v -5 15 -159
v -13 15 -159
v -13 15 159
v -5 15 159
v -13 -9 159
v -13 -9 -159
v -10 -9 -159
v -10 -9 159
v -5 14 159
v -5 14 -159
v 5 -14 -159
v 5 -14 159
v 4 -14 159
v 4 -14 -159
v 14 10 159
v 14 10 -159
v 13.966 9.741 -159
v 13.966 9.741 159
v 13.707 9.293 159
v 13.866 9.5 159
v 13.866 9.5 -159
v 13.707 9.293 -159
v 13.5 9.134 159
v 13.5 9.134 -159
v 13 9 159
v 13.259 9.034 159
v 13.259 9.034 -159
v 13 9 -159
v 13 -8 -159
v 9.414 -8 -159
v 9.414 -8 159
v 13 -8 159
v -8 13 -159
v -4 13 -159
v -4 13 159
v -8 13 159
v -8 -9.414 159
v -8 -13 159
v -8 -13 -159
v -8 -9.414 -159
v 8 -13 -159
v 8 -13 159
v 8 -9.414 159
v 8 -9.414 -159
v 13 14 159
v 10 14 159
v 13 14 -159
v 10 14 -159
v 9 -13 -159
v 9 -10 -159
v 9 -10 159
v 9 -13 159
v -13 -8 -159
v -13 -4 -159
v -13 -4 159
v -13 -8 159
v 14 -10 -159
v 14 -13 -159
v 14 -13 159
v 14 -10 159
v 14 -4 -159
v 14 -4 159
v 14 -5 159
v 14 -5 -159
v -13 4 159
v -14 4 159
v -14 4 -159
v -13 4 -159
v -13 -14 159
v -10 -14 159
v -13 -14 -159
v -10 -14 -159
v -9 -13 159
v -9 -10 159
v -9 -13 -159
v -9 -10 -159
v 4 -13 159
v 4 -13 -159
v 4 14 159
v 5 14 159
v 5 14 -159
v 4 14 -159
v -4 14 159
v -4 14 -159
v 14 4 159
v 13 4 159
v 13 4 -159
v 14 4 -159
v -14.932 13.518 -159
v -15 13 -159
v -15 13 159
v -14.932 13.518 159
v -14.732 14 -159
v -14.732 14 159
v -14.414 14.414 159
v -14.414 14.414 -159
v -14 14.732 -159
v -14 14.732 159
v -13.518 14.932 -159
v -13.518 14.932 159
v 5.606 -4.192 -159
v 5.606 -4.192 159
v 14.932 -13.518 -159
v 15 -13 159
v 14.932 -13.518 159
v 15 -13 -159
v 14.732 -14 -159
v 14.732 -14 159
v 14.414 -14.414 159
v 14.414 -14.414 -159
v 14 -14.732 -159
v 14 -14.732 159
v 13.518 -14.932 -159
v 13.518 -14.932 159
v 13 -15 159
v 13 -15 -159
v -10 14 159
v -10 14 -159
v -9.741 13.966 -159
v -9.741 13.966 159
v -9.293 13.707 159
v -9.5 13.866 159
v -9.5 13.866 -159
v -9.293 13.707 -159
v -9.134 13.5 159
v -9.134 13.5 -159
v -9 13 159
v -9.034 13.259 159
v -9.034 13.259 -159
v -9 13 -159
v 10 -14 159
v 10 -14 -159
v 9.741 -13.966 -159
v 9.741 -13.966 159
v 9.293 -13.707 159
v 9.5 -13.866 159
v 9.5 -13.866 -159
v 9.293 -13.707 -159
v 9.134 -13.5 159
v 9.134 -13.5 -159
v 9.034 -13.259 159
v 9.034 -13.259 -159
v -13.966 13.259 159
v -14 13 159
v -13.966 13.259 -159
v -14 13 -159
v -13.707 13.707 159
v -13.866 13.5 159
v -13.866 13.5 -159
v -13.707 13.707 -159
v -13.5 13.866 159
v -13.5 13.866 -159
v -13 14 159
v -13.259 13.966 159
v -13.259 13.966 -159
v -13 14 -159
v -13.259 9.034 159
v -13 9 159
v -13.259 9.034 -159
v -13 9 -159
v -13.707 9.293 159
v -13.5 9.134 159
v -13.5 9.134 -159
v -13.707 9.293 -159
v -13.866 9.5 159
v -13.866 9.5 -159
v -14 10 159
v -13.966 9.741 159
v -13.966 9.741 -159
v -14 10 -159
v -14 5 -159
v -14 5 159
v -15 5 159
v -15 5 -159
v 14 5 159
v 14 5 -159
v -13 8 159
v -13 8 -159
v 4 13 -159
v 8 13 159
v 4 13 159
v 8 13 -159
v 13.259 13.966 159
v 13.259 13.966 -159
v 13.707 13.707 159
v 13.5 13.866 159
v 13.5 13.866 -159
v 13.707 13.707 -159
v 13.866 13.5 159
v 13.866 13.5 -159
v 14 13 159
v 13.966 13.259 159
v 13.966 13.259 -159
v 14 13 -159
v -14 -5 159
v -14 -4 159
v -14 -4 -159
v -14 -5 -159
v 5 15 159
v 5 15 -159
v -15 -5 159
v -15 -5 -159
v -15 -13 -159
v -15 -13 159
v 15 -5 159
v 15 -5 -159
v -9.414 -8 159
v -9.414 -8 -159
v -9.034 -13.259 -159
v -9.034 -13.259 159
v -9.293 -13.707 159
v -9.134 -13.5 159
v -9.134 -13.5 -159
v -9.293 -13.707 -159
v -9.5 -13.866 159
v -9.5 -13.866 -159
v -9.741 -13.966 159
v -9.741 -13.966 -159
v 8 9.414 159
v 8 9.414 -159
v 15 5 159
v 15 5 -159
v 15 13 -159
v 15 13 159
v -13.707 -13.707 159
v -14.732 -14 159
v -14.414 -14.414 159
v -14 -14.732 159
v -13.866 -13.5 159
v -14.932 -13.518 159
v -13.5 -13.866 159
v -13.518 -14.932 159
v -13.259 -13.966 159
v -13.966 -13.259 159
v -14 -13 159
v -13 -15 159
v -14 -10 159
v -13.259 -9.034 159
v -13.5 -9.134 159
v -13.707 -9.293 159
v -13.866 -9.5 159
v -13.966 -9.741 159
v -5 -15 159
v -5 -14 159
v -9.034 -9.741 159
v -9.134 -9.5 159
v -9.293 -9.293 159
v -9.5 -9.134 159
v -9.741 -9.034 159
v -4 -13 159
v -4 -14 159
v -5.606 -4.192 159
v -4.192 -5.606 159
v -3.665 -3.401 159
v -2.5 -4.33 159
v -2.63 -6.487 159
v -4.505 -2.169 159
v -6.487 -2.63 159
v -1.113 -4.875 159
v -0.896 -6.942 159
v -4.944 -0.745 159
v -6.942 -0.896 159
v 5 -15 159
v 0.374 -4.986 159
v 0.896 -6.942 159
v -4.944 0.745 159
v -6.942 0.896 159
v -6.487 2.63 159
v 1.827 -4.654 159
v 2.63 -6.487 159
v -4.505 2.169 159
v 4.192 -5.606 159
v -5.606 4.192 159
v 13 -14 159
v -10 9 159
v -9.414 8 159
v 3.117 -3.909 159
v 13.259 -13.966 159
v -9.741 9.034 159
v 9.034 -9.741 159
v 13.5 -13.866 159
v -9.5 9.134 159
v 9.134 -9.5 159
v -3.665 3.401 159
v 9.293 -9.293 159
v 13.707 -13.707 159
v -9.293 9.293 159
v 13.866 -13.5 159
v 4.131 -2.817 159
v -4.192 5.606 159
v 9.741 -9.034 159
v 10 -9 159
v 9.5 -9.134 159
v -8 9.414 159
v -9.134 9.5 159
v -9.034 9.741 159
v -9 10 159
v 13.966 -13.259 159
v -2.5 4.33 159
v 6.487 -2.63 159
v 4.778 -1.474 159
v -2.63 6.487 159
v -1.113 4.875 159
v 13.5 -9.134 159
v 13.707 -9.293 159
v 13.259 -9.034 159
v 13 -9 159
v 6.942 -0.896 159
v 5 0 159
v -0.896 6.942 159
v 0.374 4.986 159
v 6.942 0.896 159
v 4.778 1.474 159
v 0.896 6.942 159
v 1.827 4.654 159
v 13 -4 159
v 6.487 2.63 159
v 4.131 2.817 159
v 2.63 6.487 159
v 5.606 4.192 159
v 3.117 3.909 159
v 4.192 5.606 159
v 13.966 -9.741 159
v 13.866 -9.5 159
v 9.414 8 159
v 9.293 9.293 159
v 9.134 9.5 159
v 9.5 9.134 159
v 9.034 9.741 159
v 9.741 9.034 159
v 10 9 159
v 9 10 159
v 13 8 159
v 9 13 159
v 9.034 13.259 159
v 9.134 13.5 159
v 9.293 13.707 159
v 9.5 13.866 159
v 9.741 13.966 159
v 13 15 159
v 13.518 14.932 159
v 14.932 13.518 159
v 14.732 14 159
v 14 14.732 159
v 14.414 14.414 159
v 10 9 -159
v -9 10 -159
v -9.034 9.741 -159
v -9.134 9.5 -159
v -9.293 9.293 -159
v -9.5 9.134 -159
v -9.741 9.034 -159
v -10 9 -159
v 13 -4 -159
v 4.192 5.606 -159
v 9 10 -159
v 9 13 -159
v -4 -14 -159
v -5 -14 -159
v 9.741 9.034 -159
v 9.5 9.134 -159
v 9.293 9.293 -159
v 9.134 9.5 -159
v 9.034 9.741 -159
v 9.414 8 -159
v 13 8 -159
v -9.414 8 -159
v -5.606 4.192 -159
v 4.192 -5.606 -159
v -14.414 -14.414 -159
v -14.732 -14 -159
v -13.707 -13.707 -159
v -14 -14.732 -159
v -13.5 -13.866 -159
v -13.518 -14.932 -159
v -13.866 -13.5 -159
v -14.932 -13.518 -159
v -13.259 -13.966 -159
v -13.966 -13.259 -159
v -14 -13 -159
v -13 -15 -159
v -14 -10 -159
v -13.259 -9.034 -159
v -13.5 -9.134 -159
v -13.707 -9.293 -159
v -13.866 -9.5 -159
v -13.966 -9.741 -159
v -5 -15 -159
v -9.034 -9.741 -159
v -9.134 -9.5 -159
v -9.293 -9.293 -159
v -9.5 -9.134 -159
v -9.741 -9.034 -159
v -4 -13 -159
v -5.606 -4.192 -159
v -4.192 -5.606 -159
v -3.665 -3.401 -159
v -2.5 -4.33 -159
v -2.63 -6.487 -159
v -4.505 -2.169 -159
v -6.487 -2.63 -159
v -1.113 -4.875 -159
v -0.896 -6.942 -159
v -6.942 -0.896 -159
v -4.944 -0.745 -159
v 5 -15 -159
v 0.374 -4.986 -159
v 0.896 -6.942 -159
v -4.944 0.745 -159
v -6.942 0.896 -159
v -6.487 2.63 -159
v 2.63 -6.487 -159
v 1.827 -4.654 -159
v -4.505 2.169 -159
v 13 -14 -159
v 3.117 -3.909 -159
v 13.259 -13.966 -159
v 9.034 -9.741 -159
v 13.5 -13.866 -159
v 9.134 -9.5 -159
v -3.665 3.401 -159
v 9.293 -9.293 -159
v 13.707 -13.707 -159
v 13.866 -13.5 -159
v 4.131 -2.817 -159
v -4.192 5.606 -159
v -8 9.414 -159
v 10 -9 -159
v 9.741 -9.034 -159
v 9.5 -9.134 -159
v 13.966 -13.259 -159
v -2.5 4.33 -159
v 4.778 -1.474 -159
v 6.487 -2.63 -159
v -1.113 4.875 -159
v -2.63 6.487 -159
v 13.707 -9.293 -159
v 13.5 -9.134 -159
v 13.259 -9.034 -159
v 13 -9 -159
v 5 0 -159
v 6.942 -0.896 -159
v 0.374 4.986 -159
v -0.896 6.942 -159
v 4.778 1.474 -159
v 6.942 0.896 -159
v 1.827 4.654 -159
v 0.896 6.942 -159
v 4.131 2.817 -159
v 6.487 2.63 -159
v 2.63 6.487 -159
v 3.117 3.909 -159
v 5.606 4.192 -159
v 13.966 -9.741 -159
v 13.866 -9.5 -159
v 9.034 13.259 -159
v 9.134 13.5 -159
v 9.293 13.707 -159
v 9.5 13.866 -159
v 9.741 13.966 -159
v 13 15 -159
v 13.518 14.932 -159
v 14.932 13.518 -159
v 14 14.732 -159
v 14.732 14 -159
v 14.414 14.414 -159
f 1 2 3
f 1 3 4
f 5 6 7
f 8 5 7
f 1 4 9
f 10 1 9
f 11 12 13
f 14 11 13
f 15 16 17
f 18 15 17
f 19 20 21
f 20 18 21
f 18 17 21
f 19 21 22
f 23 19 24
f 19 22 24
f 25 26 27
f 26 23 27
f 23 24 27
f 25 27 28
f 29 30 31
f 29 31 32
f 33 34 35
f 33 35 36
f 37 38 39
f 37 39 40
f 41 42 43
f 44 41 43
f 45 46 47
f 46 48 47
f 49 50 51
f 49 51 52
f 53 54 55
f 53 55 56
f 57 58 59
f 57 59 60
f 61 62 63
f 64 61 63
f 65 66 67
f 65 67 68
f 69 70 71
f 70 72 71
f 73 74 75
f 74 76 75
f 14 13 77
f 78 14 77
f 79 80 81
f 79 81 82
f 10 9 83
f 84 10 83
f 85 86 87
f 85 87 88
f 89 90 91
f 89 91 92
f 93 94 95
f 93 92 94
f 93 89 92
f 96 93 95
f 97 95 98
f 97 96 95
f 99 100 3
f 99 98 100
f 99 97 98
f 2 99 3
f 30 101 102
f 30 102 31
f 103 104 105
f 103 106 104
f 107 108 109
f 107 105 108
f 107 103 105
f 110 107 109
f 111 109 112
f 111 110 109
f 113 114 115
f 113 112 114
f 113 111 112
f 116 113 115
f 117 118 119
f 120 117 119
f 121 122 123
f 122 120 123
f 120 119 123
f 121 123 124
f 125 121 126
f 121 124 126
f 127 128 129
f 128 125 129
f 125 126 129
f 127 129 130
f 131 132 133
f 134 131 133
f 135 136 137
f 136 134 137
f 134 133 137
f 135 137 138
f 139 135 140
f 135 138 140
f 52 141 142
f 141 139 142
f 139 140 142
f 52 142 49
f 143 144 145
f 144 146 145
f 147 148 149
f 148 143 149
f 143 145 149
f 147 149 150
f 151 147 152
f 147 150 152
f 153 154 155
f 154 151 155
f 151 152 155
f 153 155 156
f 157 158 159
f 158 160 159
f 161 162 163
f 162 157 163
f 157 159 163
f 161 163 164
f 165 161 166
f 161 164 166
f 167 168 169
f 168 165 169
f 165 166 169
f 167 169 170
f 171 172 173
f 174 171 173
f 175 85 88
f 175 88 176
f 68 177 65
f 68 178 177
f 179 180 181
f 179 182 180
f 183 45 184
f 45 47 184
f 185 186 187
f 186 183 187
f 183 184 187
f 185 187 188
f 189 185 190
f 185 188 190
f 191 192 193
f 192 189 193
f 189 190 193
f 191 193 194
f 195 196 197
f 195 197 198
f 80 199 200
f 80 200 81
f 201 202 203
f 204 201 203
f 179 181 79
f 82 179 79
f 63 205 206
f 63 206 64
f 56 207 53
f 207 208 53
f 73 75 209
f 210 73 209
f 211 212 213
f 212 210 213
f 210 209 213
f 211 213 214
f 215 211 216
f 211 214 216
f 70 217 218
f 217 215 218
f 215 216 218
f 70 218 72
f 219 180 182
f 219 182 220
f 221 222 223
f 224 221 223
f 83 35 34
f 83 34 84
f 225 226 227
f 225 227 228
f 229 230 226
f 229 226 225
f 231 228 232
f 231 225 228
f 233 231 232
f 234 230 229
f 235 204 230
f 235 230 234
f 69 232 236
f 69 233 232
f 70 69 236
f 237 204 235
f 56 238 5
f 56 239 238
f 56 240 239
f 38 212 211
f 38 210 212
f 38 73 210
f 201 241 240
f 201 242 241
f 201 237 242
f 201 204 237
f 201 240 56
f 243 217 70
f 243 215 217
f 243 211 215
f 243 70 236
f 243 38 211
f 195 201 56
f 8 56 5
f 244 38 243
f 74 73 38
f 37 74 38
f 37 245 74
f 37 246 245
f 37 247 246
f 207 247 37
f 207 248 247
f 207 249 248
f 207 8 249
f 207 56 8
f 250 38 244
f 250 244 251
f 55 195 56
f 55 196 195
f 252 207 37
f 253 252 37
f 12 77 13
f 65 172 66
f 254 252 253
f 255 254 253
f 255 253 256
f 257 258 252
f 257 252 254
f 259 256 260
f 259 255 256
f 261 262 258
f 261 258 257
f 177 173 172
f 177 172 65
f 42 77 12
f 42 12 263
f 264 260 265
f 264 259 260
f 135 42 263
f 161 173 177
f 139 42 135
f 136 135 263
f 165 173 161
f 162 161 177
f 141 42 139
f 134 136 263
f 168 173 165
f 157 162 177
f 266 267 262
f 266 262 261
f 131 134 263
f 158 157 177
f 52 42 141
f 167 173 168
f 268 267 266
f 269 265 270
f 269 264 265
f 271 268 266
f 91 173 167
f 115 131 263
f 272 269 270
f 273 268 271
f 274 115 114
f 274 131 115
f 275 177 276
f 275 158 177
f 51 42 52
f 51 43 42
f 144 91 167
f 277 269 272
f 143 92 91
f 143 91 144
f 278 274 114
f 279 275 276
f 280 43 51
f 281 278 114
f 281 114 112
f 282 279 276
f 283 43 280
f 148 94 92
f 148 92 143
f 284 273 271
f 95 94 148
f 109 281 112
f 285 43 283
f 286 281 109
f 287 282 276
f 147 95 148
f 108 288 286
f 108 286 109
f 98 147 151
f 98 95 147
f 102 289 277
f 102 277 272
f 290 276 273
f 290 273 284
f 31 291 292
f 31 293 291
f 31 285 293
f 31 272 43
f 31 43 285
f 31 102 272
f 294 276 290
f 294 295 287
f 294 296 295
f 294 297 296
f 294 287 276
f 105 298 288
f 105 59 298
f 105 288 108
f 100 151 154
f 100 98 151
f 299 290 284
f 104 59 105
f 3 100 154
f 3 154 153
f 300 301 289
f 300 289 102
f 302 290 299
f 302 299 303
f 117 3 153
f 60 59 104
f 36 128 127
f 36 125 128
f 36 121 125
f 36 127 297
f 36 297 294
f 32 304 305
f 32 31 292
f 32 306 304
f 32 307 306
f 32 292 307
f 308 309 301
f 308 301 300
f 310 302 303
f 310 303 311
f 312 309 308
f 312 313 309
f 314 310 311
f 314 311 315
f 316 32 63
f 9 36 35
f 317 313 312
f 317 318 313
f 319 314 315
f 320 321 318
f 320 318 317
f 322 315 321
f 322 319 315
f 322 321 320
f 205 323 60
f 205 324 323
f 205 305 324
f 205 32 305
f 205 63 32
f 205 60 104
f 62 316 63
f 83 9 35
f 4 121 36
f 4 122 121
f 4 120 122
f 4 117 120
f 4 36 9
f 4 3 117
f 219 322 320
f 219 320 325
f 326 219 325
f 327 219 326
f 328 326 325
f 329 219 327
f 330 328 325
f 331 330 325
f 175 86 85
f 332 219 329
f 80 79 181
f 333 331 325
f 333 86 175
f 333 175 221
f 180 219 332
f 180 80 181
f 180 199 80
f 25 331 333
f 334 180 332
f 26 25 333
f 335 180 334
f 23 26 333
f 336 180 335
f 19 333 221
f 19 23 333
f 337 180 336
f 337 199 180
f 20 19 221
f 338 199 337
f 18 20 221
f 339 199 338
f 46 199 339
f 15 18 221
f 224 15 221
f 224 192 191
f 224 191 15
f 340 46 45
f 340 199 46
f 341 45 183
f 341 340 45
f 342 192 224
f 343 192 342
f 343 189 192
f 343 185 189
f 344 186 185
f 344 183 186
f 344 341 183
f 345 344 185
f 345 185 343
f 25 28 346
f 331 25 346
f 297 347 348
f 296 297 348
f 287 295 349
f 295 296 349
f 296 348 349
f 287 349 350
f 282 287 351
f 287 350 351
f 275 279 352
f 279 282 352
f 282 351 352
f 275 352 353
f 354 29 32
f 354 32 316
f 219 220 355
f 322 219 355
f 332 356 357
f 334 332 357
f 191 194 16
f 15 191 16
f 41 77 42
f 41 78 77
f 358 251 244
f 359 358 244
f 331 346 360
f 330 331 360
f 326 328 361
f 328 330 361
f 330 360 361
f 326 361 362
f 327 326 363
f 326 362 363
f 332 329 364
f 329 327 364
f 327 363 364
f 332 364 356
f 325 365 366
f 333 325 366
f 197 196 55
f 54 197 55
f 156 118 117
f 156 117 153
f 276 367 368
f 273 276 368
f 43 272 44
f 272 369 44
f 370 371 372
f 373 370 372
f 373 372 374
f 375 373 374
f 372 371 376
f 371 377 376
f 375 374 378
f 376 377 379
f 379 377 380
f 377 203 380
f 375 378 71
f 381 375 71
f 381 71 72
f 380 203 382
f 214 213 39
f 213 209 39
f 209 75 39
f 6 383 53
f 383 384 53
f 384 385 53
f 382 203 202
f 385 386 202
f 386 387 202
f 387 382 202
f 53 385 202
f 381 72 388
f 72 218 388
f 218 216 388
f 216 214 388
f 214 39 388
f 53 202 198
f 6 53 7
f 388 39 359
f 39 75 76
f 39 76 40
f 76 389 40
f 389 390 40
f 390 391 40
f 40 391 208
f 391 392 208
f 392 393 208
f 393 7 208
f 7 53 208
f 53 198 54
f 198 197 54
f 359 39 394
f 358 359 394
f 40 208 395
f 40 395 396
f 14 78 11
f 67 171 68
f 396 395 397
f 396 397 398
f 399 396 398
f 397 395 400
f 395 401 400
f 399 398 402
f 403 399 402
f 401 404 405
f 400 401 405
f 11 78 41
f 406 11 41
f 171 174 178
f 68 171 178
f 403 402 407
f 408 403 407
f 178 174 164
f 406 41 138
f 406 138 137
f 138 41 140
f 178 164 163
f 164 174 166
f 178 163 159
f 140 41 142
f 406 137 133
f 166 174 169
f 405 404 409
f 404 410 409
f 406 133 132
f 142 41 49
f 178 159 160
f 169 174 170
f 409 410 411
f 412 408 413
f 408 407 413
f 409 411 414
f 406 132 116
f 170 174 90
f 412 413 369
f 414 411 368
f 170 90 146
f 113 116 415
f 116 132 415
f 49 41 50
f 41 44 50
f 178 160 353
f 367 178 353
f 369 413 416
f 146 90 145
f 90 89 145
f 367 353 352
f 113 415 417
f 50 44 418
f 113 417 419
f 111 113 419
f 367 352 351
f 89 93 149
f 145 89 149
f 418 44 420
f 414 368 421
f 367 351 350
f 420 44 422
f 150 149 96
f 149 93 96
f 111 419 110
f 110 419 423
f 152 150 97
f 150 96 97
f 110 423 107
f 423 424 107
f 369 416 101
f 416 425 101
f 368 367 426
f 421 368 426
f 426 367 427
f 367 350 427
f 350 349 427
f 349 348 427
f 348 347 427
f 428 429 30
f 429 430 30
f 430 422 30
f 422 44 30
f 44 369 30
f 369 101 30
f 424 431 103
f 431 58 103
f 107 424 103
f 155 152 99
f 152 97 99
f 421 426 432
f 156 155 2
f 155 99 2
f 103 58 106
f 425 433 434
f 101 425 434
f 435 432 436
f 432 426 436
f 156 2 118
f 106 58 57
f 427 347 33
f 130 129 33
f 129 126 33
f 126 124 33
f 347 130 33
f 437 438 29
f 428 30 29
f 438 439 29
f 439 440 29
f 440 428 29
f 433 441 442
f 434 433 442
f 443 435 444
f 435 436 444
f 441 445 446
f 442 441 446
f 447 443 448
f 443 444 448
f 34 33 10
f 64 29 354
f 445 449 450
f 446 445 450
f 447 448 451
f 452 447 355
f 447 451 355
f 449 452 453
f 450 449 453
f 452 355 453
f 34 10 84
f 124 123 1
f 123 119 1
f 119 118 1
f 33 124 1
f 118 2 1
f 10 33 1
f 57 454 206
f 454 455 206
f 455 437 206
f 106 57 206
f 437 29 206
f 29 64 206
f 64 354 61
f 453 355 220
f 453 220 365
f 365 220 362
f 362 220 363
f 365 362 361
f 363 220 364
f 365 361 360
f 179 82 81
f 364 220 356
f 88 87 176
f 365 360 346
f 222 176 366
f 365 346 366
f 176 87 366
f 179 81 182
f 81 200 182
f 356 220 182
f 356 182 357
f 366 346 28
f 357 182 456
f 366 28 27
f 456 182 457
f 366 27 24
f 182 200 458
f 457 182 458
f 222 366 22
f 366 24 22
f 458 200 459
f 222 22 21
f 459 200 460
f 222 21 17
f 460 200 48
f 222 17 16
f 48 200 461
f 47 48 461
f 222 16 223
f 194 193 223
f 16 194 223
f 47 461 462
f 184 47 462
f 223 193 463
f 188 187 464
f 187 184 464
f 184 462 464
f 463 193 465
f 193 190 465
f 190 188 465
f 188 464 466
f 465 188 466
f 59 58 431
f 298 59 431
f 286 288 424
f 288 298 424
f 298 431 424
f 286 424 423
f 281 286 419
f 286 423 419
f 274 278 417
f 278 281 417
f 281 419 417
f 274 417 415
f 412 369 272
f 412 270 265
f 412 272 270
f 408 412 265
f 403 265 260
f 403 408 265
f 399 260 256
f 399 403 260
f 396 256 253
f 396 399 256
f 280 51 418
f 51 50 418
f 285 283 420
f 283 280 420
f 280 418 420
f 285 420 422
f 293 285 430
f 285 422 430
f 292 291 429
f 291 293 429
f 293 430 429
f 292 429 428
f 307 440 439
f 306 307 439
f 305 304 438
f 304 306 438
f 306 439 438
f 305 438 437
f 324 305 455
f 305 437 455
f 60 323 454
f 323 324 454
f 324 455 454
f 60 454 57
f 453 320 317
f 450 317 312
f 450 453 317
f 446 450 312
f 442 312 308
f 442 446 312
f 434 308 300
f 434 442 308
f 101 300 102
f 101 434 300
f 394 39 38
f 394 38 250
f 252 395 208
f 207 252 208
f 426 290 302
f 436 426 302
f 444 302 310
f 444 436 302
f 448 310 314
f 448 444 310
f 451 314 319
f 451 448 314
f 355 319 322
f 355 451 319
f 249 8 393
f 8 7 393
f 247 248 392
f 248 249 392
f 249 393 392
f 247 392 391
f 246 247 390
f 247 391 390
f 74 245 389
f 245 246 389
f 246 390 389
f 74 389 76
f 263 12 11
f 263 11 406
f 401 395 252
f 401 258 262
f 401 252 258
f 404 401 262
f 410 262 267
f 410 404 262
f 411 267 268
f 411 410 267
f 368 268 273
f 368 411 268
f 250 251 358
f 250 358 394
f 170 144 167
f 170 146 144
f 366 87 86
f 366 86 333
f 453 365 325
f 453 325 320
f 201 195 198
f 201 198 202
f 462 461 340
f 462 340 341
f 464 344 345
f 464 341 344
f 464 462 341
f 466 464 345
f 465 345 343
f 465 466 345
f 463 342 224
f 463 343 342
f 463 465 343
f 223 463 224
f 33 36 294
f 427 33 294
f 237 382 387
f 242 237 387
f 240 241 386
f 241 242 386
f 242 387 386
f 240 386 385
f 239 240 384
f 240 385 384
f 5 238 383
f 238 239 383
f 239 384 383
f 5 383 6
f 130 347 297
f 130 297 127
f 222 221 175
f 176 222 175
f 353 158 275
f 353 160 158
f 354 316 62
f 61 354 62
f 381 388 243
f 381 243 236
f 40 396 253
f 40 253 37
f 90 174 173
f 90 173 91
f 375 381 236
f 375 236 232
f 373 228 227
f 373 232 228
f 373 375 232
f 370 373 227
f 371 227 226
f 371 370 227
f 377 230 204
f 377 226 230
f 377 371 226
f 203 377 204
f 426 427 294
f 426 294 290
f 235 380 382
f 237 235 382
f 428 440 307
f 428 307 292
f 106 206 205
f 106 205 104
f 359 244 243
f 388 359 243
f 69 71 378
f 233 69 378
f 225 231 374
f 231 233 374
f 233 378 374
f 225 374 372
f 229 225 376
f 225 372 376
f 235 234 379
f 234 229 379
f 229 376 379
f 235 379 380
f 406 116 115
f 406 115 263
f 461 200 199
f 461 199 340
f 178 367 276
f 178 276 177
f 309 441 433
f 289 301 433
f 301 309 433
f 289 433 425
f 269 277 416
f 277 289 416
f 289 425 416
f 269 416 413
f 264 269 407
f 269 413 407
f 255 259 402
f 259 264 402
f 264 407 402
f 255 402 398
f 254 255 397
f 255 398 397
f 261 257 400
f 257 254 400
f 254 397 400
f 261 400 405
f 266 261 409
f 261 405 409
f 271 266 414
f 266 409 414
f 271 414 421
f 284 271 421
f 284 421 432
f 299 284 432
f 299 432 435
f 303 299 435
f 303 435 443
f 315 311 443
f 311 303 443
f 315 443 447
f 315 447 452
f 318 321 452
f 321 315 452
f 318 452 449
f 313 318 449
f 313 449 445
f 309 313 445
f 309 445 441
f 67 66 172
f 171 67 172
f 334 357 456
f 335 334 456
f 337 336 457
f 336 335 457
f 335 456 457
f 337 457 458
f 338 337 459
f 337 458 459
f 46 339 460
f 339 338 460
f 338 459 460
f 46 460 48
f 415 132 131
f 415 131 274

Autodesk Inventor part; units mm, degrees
ref_plane "YZ Plane" through (0, 0, 0) normal (1, 0, 0) x (0, 1, 0)
ref_plane "XZ Plane" through (0, 0, 0) normal (0, 1, 0) x (-1, 0, 0)
ref_plane "XY Plane" through (0, 0, 0) normal (0, 0, 1) x (1, 0, 0)
sketch "Sketch1" plane through (0, 0, 0) normal (0, 0, 1) x (1, 0, 0)
  circle A0 centre (0, 0) radius 5
  arc A1 (-13, 15) -> (-15, 13) centre (-13, 13) ccw
  arc A2 (-15, -13) -> (-13, -15) centre (-13, -13) ccw
  arc A3 (13, -15) -> (15, -13) centre (13, -13) ccw
  arc A4 (15, 13) -> (13, 15) centre (13, 13) ccw
  arc A5 (-13, 14) -> (-14, 13) centre (-13, 13) ccw
  arc A6 (-14, -13) -> (-13, -14) centre (-13, -13) ccw
  arc A7 (13, -14) -> (14, -13) centre (13, -13) ccw
  arc A8 (14, 13) -> (13, 14) centre (13, 13) ccw
  line L0 (14, -14) -> (-14, 14) construction
  line L1 (-14, -14) -> (14, 14) construction
  line L2 (15, -15) -> (-15, 15) construction
  line L3 (-15, -15) -> (15, 15) construction
  line L4 (-13, 15) -> (-8, 15)
  line L5 (-8, 13) -> (-8, 8) construction
  line L6 (-9.4142, 8) -> (-13, 8)
  line L7 (-15, 8) -> (-15, 13)
  line L8 (-13, -15) -> (-8, -15)
  line L9 (-8, -13) -> (-8, -9.4142)
  line L10 (-9.4142, -8) -> (-13, -8)
  line L11 (-15, -8) -> (-15, -13)
  line L12 (13, -15) -> (8, -15)
  line L13 (8, -13) -> (8, -9.4142)
  line L14 (9.4142, -8) -> (13, -8)
  line L15 (15, -8) -> (15, -13)
  line L16 (13, 15) -> (8, 15)
  line L17 (8, 13) -> (8, 9.4142)
  line L18 (9.4142, 8) -> (13, 8)
  line L19 (15, 8) -> (15, 13)
  line L20 (-13, 9) -> (-10, 9)
  line L21 (-9, 10) -> (-9, 13)
  line L22 (-10, 14) -> (-13, 14)
  line L23 (-14, 13) -> (-14, 10)
  line L24 (13, 9) -> (10, 9)
  line L25 (9, 10) -> (9, 13)
  line L26 (10, 14) -> (13, 14)
  line L27 (14, 13) -> (14, 10)
  line L28 (13, -9) -> (10, -9)
  line L29 (9, -10) -> (9, -13)
  line L30 (10, -14) -> (13, -14)
  line L31 (14, -13) -> (14, -10)
  line L32 (-13, -9) -> (-10, -9)
  line L33 (-9, -10) -> (-9, -13)
  line L34 (-10, -14) -> (-13, -14)
  line L35 (-14, -13) -> (-14, -10)
  line L36 (-14, 13) -> (-14, 10)
  line L37 (-14, -10) -> (-14, -13)
  line L38 (-14, -13) -> (-14, -10)
  line L39 (-14, 10) -> (-14, 13)
  line L40 (13, -15) -> (5, -15)
  line L41 (-5, -15) -> (-13, -15)
  line L42 (13, -15) -> (5, -15) construction
  line L43 (0, -15) -> (-13, -15) construction
  line L44 (4, -13) -> (8, -13)
  line L45 (-8, -13) -> (-4, -13)
  line L46 (10, -9) -> (13, -9)
  line L47 (14, -10) -> (14, -13)
  line L48 (13, -14) -> (10, -14)
  line L49 (9, -13) -> (9, -10)
  line L50 (5, -14) -> (5, -15)
  line L51 (13, -14) -> (10, -14)
  line L52 (5, -14) -> (4, -14)
  line L53 (4, -14) -> (5, -14)
  line L54 (10, -14) -> (13, -14)
  line L55 (-4, -14) -> (-5, -14)
  line L56 (-10, -14) -> (-13, -14)
  line L57 (-13, -14) -> (-10, -14)
  line L58 (-5, -14) -> (-4, -14)
  line L59 (14, -13) -> (14, -10)
  line L60 (14, 10) -> (14, 13)
  line L61 (14, 13) -> (14, 10)
  line L62 (14, -10) -> (14, -13)
  line L63 (-5, -14) -> (-5, -15)
  line L64 (10, 14) -> (13, 14)
  line L65 (13, 14) -> (10, 14)
  line L66 (-10, 14) -> (-13, 14)
  line L67 (-13, 14) -> (-10, 14)
  line L68 (-5, 15) -> (-5, 14)
  line L69 (-13, 15) -> (-5, 15)
  line L70 (5, 15) -> (13, 15)
  line L71 (-15, 15) -> (-5, 15) construction
  line L72 (5, 15) -> (15, 15) construction
  line L73 (5, 15) -> (5, 14)
  line L74 (8, 13) -> (4, 13)
  line L75 (5, 14) -> (4, 14)
  line L76 (-5, 14) -> (-4, 14)
  line L77 (4, 14) -> (5, 14)
  line L78 (-4, 13) -> (-8, 13)
  line L79 (-4, 14) -> (-5, 14)
  line L80 (4, 13) -> (4, 14)
  line L81 (-4, 13) -> (-4, 14)
  line L82 (-4, -14) -> (-4, -13)
  line L83 (4, -14) -> (4, -13)
  line L84 (-8, 9.4142) -> (-4.1919, 5.6061)
  line L85 (8, 9.4142) -> (4.1919, 5.6061)
  line L86 (9.4142, 8) -> (5.6061, 4.1919)
  line L87 (5.6061, -4.1919) -> (9.4142, -8)
  line L88 (4.1919, -5.6061) -> (8, -9.4142)
  line L89 (-4.1919, -5.6061) -> (-8, -9.4142)
  line L90 (-5.6061, -4.1919) -> (-9.4142, -8)
  line L91 (-9.4142, 8) -> (-5.6061, 4.1919)
  arc A9 (4.1919, 5.6061) -> (-4.1919, 5.6061) centre (0, 0) ccw
  arc A10 (5.6061, -4.1919) -> (5.6061, 4.1919) centre (0, 0) ccw
  arc A11 (-5.6061, 4.1919) -> (-5.6061, -4.1919) centre (0, 0) ccw
  arc A12 (-4.1919, -5.6061) -> (4.1919, -5.6061) centre (0, 0) ccw
  line L92 (-8, 13) -> (-8, 9.4142)
  line L93 (-15, -13) -> (-15, -5) construction
  line L94 (-15, -13) -> (-15, -5)
  line L95 (-15, 5) -> (-15, 13)
  line L96 (15, -5) -> (15, -13) construction
  line L97 (15, 13) -> (15, 5)
  line L98 (15, -5) -> (15, -13)
  line L99 (-14, -4) -> (-14, -5)
  line L100 (14, -4) -> (14, -5)
  line L101 (14, 4) -> (14, 5)
  line L102 (-14, 4) -> (-14, 5)
  line L103 (-13, 8) -> (-13, 4)
  line L104 (13, 4) -> (13, 8)
  line L105 (13, -8) -> (13, -4)
  line L106 (-13, -4) -> (-13, -8)
  line L107 (-14, -5) -> (-15, -5)
  line L108 (15, -5) -> (14, -5)
  line L109 (15, 5) -> (14, 5)
  line L110 (-14, 5) -> (-15, 5)
  line L111 (13, 4) -> (14, 4)
  line L112 (-14, 4) -> (-13, 4)
  line L113 (-14, -4) -> (-13, -4)
  line L114 (13, -4) -> (14, -4)
  arc A13 (-13, -9) -> (-14, -10) centre (-13, -10) ccw
  arc A14 (-9, -10) -> (-10, -9) centre (-10, -10) ccw
  arc A15 (-10, -14) -> (-9, -13) centre (-10, -13) ccw
  arc A16 (10, -9) -> (9, -10) centre (10, -10) ccw
  arc A17 (9, -13) -> (10, -14) centre (10, -13) ccw
  arc A18 (14, -10) -> (13, -9) centre (13, -10) ccw
  arc A19 (10, 14) -> (9, 13) centre (10, 13) ccw
  arc A20 (9, 10) -> (10, 9) centre (10, 10) ccw
  arc A21 (13, 9) -> (14, 10) centre (13, 10) ccw
  arc A22 (-9, 13) -> (-10, 14) centre (-10, 13) ccw
  arc A23 (-10, 9) -> (-9, 10) centre (-10, 10) ccw
  arc A24 (-14, 10) -> (-13, 9) centre (-13, 10) ccw
  point P0 (15, -15)
  point P1 (-5.5858, -7)
  dimension "d0" = 30
  dimension "d1" = 30
  dimension "d2" = 10
  dimension "d4" = 2
  dimension "d11" = 28
  dimension "d12" = 7
  dimension "d13" = 7
  dimension "d15" = 1
  dimension "d16" = 1
  dimension "d17" = 1
  dimension "d18" = 1
  dimension "d19" = 5
  dimension "d23" = 30
  dimension "d27" = 1
  dimension "d30" = 3.5858
  dimension "d31" = 2
  dimension "d32" = 16
  dimension "d33" = 8
  dimension "d34" = 6
  dimension "d35" = 5.5858
extrude "Extrusion1" add sketch "Sketch1" along normal mid plane 318
equation "\"d1\" = d0"
properties part number "trail" material "Aluminum 6061"
